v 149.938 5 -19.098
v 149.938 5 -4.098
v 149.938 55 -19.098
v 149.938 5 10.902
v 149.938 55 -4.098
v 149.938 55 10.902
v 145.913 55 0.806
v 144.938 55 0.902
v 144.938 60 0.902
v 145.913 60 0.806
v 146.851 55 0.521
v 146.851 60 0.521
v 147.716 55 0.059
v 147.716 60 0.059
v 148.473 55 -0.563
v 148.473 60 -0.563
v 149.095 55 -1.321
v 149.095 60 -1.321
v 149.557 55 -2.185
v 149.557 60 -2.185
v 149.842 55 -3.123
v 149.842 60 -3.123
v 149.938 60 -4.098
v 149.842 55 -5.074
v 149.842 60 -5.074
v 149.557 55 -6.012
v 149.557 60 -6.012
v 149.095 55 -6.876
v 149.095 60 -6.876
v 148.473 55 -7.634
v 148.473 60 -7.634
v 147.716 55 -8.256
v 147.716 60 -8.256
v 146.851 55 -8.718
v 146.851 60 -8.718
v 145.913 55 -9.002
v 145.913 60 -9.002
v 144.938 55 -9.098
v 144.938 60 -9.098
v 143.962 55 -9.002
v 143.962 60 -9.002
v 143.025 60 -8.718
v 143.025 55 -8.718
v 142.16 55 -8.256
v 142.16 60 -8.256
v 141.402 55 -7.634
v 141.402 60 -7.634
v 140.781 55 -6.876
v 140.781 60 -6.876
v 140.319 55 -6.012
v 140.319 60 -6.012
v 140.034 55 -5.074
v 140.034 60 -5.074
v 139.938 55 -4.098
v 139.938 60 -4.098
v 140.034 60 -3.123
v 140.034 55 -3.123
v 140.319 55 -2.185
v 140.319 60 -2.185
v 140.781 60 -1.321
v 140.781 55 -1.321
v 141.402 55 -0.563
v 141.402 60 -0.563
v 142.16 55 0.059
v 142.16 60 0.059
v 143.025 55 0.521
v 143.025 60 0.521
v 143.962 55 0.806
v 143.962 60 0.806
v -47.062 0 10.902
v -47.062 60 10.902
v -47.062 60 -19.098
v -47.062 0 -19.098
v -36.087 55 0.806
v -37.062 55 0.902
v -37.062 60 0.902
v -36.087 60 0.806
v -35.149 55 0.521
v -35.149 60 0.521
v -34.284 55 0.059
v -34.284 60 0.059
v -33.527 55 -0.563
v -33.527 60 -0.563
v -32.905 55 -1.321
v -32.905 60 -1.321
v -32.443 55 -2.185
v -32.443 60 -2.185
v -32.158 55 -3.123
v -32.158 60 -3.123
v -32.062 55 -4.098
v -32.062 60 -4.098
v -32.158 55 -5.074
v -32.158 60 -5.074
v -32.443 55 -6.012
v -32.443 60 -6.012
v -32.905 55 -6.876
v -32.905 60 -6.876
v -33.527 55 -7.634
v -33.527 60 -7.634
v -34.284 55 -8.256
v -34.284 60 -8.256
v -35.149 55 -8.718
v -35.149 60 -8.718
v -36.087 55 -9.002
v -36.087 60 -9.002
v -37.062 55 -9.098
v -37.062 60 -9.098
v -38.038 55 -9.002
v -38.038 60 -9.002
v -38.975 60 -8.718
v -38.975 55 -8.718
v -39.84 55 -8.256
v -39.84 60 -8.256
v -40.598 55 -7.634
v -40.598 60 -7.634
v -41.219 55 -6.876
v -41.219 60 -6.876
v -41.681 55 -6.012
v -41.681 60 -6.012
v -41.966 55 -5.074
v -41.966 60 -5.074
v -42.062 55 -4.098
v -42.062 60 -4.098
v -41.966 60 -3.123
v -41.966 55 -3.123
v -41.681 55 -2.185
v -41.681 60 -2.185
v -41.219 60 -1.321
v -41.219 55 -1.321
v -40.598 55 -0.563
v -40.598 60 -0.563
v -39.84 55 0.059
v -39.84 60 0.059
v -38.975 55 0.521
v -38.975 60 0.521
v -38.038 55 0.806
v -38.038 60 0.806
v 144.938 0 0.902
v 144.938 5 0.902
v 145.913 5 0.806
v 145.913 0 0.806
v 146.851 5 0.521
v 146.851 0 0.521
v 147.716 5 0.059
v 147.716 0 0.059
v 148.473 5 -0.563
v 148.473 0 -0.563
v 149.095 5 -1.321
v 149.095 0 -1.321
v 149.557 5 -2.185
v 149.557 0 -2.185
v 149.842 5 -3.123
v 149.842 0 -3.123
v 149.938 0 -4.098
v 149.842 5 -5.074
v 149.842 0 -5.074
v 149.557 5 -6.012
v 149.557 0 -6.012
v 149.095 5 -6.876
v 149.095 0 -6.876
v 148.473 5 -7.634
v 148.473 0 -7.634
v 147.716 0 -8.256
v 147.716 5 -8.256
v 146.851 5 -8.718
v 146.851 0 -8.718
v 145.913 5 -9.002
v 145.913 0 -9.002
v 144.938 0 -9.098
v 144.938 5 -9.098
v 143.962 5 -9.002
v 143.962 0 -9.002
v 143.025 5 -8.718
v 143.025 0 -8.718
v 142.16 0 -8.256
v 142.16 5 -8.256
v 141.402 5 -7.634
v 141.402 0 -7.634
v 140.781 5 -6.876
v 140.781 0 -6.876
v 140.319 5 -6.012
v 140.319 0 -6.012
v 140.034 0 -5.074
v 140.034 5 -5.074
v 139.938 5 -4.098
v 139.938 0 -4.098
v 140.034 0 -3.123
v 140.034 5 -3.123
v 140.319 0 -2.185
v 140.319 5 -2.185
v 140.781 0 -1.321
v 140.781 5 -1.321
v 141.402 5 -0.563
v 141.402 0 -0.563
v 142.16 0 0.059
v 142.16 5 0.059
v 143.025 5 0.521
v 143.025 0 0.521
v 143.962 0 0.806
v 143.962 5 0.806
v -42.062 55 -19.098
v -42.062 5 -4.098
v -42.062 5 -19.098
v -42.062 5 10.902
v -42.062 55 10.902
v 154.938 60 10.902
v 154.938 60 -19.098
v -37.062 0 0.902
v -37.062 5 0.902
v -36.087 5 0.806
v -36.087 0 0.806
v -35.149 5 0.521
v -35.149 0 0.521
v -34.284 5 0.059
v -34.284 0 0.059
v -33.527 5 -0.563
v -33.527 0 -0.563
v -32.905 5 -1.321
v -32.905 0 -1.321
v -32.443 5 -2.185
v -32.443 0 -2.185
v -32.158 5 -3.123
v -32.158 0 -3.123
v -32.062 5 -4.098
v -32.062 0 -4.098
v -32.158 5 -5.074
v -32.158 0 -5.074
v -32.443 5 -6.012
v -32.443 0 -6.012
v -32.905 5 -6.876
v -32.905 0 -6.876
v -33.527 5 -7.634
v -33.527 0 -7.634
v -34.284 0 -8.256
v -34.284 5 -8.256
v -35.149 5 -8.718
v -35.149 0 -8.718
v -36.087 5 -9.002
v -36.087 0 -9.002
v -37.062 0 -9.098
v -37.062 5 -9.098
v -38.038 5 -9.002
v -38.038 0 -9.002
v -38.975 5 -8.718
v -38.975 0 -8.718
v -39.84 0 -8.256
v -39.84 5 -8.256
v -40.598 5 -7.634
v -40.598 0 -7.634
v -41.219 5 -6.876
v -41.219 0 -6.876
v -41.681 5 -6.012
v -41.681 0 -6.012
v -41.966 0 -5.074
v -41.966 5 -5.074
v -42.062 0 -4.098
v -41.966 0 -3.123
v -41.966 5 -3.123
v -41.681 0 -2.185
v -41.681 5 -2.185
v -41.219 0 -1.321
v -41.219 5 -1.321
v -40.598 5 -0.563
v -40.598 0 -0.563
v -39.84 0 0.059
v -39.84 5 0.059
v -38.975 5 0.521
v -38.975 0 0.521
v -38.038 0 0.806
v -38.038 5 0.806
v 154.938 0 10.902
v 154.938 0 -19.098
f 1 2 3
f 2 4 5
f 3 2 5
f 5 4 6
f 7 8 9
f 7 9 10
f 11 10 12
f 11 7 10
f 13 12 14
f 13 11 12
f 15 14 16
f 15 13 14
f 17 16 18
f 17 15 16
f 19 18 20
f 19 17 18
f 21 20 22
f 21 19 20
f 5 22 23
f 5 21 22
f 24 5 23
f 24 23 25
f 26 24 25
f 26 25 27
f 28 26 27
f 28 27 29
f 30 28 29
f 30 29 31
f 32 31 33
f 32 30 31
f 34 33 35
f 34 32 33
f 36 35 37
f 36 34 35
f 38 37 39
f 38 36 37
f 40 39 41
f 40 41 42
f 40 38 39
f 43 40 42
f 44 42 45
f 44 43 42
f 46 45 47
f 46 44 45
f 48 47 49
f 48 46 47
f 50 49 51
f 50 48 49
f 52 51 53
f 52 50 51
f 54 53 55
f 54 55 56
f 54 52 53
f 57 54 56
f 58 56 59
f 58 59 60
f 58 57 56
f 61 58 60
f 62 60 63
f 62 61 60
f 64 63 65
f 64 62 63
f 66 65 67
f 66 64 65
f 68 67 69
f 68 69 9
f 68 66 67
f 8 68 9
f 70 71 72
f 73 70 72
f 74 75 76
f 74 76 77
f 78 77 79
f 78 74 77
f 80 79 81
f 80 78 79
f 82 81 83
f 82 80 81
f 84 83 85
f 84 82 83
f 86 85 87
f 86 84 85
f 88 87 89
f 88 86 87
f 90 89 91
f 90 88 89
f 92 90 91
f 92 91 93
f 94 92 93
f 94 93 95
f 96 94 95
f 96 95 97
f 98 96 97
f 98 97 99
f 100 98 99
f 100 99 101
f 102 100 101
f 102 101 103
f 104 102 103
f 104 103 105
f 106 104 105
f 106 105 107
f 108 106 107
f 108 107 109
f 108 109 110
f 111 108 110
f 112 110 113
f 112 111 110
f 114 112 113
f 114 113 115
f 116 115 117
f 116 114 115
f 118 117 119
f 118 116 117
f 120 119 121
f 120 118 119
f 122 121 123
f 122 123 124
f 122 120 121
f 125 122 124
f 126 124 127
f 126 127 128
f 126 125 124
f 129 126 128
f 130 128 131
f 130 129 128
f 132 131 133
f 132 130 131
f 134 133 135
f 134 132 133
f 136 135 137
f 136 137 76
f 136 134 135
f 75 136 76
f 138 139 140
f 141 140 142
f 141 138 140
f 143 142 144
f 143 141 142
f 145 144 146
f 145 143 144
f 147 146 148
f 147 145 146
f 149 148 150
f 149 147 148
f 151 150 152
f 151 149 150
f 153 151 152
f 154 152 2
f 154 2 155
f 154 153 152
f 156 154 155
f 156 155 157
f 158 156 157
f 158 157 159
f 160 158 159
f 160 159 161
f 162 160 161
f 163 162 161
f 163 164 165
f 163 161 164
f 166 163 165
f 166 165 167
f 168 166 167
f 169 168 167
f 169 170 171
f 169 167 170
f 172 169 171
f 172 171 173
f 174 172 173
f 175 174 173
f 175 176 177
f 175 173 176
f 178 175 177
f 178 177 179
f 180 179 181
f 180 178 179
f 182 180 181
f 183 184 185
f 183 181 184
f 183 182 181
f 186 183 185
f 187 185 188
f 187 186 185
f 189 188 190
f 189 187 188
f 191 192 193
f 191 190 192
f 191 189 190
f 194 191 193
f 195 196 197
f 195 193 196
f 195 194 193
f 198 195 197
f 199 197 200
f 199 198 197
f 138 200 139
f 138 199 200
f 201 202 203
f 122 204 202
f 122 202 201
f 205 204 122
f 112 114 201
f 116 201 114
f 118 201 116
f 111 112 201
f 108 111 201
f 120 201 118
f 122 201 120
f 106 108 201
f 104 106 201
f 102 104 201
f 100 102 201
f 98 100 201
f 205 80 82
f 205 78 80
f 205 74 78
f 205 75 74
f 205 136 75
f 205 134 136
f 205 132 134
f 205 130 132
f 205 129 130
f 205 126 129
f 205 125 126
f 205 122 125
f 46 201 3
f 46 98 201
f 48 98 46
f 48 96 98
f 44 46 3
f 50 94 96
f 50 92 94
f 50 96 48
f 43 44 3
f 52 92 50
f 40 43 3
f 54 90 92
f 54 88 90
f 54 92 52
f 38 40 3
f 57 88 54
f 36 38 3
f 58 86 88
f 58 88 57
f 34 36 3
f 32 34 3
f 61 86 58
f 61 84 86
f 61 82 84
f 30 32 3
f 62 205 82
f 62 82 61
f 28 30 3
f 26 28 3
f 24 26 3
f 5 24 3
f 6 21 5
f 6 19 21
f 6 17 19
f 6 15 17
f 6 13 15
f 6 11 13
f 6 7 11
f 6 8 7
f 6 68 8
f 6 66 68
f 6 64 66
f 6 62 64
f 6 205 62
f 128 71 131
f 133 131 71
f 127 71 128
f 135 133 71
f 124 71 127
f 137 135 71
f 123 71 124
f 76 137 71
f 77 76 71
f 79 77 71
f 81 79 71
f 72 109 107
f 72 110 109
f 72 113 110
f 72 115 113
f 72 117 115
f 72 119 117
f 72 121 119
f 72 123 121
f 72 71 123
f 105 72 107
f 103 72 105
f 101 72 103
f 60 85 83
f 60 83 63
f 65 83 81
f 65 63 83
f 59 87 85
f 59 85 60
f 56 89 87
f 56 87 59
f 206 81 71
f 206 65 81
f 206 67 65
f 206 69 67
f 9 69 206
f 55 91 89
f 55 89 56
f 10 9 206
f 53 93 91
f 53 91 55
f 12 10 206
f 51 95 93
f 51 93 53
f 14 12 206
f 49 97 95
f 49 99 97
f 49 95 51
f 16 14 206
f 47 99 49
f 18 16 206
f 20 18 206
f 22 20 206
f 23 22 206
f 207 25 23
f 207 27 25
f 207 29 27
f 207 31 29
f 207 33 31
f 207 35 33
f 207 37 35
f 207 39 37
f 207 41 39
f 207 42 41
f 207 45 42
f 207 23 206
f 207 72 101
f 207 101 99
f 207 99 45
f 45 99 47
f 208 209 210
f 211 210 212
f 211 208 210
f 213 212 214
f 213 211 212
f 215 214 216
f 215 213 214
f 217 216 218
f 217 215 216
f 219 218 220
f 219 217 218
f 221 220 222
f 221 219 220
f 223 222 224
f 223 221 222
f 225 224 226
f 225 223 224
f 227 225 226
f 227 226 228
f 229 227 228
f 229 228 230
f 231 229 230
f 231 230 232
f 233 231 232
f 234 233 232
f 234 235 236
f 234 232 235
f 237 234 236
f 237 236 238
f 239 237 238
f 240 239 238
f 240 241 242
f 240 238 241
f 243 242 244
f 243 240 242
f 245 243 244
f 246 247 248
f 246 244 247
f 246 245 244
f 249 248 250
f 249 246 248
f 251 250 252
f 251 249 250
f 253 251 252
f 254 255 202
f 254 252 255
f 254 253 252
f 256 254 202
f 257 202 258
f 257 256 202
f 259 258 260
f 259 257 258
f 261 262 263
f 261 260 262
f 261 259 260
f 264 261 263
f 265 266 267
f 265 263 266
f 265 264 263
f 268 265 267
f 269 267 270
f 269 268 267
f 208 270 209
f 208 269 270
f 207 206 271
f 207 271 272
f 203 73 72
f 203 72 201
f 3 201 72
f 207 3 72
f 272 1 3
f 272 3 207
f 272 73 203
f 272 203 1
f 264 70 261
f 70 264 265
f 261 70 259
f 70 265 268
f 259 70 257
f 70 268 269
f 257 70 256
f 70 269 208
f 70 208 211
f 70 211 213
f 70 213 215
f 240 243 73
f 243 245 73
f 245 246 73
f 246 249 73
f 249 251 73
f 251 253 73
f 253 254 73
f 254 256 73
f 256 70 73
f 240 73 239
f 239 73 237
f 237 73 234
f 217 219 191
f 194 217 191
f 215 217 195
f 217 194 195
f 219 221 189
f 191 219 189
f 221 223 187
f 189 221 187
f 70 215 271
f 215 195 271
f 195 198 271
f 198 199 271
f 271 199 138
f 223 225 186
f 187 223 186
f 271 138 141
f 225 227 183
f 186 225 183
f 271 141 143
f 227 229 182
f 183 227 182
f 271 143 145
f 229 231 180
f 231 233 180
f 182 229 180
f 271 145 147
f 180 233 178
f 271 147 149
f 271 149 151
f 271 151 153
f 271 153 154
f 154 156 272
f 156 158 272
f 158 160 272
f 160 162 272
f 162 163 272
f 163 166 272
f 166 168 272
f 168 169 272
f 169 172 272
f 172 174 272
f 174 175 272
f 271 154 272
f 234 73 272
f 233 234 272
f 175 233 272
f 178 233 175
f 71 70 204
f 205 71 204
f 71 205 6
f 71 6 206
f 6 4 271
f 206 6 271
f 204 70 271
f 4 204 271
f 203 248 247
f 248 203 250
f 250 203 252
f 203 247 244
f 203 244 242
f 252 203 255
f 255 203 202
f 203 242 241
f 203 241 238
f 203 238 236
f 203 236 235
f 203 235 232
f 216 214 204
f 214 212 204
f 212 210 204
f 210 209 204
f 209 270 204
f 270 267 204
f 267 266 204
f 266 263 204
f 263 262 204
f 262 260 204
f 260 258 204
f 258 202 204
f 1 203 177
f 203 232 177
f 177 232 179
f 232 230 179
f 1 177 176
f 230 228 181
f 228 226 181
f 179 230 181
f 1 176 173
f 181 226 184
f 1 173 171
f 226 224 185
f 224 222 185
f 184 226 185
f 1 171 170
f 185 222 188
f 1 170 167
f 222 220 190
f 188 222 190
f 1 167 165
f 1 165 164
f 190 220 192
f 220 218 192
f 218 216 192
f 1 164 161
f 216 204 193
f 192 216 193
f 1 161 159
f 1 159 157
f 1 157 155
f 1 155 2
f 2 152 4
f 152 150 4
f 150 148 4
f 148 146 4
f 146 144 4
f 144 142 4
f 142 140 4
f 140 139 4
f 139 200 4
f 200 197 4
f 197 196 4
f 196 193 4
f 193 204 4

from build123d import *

# Parameters (mm, degrees)
CROQUIS1_W              = 202
CROQUIS1_H              = 30
CROQUIS1_R              = 5
SALIENTE_EXTRUIR1_DEPTH = 60
CROQUIS2_W              = 192
CROQUIS2_H              = 50
CORTAR_EXTRUIR1_DEPTH   = 169.836501235


with BuildPart() as part:
    # Croquis1 → Saliente-Extruir1 (new body)
    with BuildSketch(Plane(origin=(0, 0, 0), x_dir=(1, 0, 0), z_dir=(0, 1, 0))):
        with Locations((53.937936443, 4.098360656)):
            Rectangle(CROQUIS1_W, CROQUIS1_H)
        with Locations(Location((-37.062063557, 4.098360656, 0), (0, 0, 270))):
            Circle(CROQUIS1_R, mode=Mode.SUBTRACT)
        with Locations(Location((144.937936443, 4.098360656, 0), (0, 0, 270))):
            Circle(CROQUIS1_R, mode=Mode.SUBTRACT)
    extrude(amount=SALIENTE_EXTRUIR1_DEPTH)

    # Croquis2 → Cortar-Extruir1 (cut, through all)
    with BuildSketch(Plane.XY.offset(10.901639344)):
        with Locations((53.937936443, 30)):
            Rectangle(CROQUIS2_W, CROQUIS2_H)
    extrude(amount=-CORTAR_EXTRUIR1_DEPTH, mode=Mode.SUBTRACT)


solid = part.part
